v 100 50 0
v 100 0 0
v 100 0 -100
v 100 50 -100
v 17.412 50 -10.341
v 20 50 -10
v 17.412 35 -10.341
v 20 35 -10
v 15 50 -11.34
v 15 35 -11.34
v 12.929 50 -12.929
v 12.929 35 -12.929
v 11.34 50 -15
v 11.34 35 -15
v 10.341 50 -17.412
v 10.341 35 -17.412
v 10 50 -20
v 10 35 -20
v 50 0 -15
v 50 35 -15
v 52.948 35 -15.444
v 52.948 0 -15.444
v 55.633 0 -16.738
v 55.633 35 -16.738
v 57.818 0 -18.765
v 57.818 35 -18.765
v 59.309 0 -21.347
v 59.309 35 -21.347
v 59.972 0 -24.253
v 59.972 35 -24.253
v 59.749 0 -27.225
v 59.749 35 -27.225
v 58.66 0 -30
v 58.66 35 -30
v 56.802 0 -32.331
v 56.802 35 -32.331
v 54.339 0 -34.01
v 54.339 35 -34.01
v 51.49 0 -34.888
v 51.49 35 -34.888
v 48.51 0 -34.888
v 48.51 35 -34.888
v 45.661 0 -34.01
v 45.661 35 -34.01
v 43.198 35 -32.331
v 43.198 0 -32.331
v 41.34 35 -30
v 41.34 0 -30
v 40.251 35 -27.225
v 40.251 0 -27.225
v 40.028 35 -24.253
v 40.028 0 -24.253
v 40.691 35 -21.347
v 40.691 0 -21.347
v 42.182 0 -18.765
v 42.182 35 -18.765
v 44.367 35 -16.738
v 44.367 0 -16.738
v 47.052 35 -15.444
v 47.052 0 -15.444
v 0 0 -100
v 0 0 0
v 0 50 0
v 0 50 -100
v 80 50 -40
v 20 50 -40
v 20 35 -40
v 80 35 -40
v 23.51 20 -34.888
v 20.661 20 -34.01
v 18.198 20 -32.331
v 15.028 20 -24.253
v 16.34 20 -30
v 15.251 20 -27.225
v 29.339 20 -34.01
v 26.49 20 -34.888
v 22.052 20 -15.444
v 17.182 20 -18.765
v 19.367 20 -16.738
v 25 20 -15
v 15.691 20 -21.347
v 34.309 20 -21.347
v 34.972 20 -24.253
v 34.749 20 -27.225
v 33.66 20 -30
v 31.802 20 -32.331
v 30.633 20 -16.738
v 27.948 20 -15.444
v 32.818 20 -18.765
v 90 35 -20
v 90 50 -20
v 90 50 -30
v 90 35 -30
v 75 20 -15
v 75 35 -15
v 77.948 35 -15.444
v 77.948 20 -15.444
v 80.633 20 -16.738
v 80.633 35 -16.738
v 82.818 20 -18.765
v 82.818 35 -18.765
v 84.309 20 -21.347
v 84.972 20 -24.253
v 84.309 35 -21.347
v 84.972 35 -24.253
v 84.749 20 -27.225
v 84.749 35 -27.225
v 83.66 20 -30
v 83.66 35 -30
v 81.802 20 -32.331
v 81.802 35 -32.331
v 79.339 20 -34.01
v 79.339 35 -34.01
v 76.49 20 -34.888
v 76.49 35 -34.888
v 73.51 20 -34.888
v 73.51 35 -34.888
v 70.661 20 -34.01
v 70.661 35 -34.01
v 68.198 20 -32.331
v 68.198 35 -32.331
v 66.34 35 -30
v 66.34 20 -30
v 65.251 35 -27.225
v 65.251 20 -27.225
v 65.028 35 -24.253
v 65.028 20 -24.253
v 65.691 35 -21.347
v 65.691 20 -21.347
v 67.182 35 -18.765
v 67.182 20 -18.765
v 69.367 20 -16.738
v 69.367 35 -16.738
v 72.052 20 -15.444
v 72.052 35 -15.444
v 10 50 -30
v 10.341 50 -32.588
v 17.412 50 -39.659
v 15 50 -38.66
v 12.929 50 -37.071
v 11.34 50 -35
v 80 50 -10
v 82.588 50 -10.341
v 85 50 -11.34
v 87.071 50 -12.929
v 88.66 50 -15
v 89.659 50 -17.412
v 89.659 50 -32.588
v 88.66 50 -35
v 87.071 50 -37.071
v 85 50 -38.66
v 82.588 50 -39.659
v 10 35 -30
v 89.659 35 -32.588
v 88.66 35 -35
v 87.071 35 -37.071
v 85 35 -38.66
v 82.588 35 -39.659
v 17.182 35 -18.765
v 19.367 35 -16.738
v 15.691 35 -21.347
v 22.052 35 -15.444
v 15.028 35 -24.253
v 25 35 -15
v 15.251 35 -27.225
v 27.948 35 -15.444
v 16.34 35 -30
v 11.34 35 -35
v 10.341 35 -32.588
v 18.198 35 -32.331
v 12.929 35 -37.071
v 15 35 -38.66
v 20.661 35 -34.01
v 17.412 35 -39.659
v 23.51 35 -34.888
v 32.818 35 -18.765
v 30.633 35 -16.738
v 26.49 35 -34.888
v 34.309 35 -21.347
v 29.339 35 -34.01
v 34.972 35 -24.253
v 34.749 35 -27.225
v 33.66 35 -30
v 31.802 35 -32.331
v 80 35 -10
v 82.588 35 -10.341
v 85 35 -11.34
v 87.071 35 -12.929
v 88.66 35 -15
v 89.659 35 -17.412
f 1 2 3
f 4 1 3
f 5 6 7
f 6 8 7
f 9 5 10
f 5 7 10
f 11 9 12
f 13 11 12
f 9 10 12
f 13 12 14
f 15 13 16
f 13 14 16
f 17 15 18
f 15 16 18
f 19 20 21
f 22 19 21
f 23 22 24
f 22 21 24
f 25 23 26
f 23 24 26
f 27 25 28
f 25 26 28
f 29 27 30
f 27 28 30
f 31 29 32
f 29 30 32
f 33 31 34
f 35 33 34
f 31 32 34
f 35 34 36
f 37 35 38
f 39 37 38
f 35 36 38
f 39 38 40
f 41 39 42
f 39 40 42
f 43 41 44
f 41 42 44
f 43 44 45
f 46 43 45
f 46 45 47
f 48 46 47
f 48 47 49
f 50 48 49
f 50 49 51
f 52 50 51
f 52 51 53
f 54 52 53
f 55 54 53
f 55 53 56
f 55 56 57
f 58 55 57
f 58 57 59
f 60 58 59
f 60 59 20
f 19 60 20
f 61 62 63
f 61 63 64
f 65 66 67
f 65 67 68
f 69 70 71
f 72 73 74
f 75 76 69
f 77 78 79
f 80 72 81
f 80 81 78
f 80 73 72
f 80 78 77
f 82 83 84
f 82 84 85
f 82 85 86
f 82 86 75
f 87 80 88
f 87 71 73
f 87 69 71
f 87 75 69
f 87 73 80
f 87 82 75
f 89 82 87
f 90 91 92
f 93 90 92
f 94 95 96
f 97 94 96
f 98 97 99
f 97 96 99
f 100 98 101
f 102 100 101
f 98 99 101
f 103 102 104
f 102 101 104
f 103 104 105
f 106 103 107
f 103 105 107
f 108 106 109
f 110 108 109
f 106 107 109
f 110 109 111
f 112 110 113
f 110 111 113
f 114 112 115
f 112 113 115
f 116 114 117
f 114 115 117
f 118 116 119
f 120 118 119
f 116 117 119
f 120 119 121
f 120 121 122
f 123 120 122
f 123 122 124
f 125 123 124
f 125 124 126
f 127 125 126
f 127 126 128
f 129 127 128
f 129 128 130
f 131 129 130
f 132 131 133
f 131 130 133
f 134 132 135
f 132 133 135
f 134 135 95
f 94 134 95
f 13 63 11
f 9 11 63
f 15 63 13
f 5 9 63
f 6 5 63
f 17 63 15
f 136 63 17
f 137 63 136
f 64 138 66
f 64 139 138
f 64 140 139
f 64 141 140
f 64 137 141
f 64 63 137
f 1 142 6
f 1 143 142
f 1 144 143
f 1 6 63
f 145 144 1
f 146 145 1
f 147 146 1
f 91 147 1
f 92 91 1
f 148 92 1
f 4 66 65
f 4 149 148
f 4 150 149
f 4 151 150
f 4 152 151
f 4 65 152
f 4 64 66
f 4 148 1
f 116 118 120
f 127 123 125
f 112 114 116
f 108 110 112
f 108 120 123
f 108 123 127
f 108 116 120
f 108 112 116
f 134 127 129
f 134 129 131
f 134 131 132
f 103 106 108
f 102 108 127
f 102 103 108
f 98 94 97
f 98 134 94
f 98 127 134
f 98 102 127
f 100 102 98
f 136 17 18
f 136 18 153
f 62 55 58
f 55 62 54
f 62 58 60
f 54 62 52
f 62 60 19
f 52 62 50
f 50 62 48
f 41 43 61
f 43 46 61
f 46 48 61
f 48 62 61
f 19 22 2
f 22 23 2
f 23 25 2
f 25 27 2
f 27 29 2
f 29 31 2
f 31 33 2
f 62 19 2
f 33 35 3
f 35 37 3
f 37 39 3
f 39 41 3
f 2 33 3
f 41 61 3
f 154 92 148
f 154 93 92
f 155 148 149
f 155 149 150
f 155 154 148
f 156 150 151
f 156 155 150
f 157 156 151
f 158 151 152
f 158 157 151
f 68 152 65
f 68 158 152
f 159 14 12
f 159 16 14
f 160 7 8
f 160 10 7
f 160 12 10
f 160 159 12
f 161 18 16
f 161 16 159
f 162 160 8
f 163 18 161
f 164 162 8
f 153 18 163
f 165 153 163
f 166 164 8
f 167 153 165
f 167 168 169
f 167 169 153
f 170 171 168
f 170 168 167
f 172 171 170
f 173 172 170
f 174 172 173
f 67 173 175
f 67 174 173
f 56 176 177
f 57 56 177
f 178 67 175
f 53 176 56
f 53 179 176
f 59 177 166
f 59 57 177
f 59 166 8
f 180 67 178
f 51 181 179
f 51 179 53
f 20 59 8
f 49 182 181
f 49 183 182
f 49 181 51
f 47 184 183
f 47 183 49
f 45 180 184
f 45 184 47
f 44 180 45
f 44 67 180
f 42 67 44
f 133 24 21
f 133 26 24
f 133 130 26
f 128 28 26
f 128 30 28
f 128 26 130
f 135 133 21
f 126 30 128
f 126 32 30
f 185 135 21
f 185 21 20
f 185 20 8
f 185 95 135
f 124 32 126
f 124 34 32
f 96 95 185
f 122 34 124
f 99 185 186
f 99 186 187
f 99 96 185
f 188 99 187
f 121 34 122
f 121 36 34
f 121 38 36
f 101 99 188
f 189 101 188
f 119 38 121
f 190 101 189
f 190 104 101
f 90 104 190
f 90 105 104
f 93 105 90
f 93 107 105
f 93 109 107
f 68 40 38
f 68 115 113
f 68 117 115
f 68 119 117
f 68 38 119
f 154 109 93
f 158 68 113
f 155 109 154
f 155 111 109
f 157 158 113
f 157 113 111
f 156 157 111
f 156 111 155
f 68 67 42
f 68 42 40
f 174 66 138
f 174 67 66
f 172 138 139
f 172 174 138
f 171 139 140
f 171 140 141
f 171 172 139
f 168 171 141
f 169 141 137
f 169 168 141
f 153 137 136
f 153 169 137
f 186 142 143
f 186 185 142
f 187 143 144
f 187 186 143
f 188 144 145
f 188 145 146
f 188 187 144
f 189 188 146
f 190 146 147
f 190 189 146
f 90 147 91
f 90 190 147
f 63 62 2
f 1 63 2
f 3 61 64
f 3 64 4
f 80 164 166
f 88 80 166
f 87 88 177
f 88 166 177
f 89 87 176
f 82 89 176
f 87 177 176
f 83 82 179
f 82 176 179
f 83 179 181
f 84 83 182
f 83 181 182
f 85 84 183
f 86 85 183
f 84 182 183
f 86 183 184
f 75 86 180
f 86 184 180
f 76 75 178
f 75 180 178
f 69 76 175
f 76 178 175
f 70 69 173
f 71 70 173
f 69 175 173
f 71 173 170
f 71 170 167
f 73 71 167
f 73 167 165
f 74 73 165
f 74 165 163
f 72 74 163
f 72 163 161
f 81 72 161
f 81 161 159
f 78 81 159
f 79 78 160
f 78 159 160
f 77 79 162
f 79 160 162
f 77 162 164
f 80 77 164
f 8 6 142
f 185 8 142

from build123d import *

# Parameters (mm, degrees)
SKETCH1_W           = 100
SKETCH1_H           = 100
BOSS_EXTRUDE1_DEPTH = 50
SKETCH3_W           = 80
SKETCH3_H           = 30
CUT_EXTRUDE2_DEPTH  = 15
FILLET1_R           = 10
SKETCH4_R           = 10
CUT_EXTRUDE3_DEPTH  = 15
SKETCH5_R           = 10
CUT_EXTRUDE4_DEPTH  = 146.688022843


with BuildPart() as part:
    # Sketch1 → Boss-Extrude1 (new body)
    with BuildSketch(Plane(origin=(0, 0, 0), x_dir=(1, 0, 0), z_dir=(0, 1, 0))):
        with Locations((50, 50)):
            Rectangle(SKETCH1_W, SKETCH1_H)
    extrude(amount=BOSS_EXTRUDE1_DEPTH)

    # Sketch3 → Cut-Extrude2 (cut)
    with BuildSketch(Plane(origin=(0, 50, 0), x_dir=(1, 0, 0), z_dir=(0, 1, 0))):
        with Locations((50, 25)):
            Rectangle(SKETCH3_W, SKETCH3_H)
    extrude(amount=-CUT_EXTRUDE2_DEPTH, mode=Mode.SUBTRACT)

    # Fillet1
    fillet1_edges = [part.edges().sort_by_distance(p)[0] for p in [
        (10, 42.5, -10),
        (10, 42.5, -40),
        (90, 42.5, -40),
        (90, 42.5, -10),
    ]]
    fillet(fillet1_edges, radius=FILLET1_R)

    # Sketch4 → Cut-Extrude3 (cut)
    with BuildSketch(Plane(origin=(0, 35, 0), x_dir=(1, 0, 0), z_dir=(0, 1, 0))):
        with Locations(Location((25, 25, 0), (0, 0, 270))):
            Circle(SKETCH4_R)
        with Locations(Location((75, 25, 0), (0, 0, 270))):
            Circle(SKETCH4_R)
    extrude(amount=-CUT_EXTRUDE3_DEPTH, mode=Mode.SUBTRACT)

    # Sketch5 → Cut-Extrude4 (cut, through all)
    with BuildSketch(Plane(origin=(0, 35, 0), x_dir=(1, 0, 0), z_dir=(0, 1, 0))):
        with Locations(Location((50, 25, 0), (0, 0, 270))):
            Circle(SKETCH5_R)
    extrude(amount=-CUT_EXTRUDE4_DEPTH, mode=Mode.SUBTRACT)


solid = part.part
